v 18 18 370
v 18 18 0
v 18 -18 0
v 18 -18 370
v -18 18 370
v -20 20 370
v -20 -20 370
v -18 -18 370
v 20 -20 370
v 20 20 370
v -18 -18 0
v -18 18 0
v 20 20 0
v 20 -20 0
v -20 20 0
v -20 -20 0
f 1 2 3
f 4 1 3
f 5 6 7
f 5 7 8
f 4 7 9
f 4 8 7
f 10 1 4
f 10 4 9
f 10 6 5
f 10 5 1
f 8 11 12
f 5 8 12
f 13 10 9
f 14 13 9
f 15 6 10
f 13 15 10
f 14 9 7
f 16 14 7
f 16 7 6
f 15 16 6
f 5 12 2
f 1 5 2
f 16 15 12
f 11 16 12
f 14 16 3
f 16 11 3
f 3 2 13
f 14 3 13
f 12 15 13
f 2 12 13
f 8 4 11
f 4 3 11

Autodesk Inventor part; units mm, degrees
ref_plane "YZ Plane" through (0, 0, 0) normal (1, 0, 0) x (0, 1, 0)
ref_plane "XZ Plane" through (0, 0, 0) normal (0, 1, 0) x (-1, 0, 0)
ref_plane "XY Plane" through (0, 0, 0) normal (0, 0, 1) x (1, 0, 0)
sketch "Boceto1" plane through (0, 0, 0) normal (0, 0, 1) x (1, 0, 0)
  line L0 (-20, 20) -> (20, 20)
  line L1 (20, 20) -> (20, -20)
  line L2 (20, -20) -> (-20, -20)
  line L3 (-20, -20) -> (-20, 20)
  line L4 (-20, 20) -> (20, -20) construction
  line L5 (-18, 18) -> (18, 18)
  line L6 (18, 18) -> (18, -18)
  line L7 (18, -18) -> (-18, -18)
  line L8 (-18, -18) -> (-18, 18)
  line L9 (-18, 0) -> (-20, 0) construction
  line L10 (0, 18) -> (0, 20) construction
  line L11 (18, 0) -> (20, 0) construction
  line L12 (0, -18) -> (0, -20) construction
  point P0 (0, 0)
  point P1 (0, 0)
  dimension "d0" = 40
  dimension "d1" = 2
extrude "Extrusión1" add sketch "Boceto1" along normal blind 370
properties part number "C_358_40_2"
